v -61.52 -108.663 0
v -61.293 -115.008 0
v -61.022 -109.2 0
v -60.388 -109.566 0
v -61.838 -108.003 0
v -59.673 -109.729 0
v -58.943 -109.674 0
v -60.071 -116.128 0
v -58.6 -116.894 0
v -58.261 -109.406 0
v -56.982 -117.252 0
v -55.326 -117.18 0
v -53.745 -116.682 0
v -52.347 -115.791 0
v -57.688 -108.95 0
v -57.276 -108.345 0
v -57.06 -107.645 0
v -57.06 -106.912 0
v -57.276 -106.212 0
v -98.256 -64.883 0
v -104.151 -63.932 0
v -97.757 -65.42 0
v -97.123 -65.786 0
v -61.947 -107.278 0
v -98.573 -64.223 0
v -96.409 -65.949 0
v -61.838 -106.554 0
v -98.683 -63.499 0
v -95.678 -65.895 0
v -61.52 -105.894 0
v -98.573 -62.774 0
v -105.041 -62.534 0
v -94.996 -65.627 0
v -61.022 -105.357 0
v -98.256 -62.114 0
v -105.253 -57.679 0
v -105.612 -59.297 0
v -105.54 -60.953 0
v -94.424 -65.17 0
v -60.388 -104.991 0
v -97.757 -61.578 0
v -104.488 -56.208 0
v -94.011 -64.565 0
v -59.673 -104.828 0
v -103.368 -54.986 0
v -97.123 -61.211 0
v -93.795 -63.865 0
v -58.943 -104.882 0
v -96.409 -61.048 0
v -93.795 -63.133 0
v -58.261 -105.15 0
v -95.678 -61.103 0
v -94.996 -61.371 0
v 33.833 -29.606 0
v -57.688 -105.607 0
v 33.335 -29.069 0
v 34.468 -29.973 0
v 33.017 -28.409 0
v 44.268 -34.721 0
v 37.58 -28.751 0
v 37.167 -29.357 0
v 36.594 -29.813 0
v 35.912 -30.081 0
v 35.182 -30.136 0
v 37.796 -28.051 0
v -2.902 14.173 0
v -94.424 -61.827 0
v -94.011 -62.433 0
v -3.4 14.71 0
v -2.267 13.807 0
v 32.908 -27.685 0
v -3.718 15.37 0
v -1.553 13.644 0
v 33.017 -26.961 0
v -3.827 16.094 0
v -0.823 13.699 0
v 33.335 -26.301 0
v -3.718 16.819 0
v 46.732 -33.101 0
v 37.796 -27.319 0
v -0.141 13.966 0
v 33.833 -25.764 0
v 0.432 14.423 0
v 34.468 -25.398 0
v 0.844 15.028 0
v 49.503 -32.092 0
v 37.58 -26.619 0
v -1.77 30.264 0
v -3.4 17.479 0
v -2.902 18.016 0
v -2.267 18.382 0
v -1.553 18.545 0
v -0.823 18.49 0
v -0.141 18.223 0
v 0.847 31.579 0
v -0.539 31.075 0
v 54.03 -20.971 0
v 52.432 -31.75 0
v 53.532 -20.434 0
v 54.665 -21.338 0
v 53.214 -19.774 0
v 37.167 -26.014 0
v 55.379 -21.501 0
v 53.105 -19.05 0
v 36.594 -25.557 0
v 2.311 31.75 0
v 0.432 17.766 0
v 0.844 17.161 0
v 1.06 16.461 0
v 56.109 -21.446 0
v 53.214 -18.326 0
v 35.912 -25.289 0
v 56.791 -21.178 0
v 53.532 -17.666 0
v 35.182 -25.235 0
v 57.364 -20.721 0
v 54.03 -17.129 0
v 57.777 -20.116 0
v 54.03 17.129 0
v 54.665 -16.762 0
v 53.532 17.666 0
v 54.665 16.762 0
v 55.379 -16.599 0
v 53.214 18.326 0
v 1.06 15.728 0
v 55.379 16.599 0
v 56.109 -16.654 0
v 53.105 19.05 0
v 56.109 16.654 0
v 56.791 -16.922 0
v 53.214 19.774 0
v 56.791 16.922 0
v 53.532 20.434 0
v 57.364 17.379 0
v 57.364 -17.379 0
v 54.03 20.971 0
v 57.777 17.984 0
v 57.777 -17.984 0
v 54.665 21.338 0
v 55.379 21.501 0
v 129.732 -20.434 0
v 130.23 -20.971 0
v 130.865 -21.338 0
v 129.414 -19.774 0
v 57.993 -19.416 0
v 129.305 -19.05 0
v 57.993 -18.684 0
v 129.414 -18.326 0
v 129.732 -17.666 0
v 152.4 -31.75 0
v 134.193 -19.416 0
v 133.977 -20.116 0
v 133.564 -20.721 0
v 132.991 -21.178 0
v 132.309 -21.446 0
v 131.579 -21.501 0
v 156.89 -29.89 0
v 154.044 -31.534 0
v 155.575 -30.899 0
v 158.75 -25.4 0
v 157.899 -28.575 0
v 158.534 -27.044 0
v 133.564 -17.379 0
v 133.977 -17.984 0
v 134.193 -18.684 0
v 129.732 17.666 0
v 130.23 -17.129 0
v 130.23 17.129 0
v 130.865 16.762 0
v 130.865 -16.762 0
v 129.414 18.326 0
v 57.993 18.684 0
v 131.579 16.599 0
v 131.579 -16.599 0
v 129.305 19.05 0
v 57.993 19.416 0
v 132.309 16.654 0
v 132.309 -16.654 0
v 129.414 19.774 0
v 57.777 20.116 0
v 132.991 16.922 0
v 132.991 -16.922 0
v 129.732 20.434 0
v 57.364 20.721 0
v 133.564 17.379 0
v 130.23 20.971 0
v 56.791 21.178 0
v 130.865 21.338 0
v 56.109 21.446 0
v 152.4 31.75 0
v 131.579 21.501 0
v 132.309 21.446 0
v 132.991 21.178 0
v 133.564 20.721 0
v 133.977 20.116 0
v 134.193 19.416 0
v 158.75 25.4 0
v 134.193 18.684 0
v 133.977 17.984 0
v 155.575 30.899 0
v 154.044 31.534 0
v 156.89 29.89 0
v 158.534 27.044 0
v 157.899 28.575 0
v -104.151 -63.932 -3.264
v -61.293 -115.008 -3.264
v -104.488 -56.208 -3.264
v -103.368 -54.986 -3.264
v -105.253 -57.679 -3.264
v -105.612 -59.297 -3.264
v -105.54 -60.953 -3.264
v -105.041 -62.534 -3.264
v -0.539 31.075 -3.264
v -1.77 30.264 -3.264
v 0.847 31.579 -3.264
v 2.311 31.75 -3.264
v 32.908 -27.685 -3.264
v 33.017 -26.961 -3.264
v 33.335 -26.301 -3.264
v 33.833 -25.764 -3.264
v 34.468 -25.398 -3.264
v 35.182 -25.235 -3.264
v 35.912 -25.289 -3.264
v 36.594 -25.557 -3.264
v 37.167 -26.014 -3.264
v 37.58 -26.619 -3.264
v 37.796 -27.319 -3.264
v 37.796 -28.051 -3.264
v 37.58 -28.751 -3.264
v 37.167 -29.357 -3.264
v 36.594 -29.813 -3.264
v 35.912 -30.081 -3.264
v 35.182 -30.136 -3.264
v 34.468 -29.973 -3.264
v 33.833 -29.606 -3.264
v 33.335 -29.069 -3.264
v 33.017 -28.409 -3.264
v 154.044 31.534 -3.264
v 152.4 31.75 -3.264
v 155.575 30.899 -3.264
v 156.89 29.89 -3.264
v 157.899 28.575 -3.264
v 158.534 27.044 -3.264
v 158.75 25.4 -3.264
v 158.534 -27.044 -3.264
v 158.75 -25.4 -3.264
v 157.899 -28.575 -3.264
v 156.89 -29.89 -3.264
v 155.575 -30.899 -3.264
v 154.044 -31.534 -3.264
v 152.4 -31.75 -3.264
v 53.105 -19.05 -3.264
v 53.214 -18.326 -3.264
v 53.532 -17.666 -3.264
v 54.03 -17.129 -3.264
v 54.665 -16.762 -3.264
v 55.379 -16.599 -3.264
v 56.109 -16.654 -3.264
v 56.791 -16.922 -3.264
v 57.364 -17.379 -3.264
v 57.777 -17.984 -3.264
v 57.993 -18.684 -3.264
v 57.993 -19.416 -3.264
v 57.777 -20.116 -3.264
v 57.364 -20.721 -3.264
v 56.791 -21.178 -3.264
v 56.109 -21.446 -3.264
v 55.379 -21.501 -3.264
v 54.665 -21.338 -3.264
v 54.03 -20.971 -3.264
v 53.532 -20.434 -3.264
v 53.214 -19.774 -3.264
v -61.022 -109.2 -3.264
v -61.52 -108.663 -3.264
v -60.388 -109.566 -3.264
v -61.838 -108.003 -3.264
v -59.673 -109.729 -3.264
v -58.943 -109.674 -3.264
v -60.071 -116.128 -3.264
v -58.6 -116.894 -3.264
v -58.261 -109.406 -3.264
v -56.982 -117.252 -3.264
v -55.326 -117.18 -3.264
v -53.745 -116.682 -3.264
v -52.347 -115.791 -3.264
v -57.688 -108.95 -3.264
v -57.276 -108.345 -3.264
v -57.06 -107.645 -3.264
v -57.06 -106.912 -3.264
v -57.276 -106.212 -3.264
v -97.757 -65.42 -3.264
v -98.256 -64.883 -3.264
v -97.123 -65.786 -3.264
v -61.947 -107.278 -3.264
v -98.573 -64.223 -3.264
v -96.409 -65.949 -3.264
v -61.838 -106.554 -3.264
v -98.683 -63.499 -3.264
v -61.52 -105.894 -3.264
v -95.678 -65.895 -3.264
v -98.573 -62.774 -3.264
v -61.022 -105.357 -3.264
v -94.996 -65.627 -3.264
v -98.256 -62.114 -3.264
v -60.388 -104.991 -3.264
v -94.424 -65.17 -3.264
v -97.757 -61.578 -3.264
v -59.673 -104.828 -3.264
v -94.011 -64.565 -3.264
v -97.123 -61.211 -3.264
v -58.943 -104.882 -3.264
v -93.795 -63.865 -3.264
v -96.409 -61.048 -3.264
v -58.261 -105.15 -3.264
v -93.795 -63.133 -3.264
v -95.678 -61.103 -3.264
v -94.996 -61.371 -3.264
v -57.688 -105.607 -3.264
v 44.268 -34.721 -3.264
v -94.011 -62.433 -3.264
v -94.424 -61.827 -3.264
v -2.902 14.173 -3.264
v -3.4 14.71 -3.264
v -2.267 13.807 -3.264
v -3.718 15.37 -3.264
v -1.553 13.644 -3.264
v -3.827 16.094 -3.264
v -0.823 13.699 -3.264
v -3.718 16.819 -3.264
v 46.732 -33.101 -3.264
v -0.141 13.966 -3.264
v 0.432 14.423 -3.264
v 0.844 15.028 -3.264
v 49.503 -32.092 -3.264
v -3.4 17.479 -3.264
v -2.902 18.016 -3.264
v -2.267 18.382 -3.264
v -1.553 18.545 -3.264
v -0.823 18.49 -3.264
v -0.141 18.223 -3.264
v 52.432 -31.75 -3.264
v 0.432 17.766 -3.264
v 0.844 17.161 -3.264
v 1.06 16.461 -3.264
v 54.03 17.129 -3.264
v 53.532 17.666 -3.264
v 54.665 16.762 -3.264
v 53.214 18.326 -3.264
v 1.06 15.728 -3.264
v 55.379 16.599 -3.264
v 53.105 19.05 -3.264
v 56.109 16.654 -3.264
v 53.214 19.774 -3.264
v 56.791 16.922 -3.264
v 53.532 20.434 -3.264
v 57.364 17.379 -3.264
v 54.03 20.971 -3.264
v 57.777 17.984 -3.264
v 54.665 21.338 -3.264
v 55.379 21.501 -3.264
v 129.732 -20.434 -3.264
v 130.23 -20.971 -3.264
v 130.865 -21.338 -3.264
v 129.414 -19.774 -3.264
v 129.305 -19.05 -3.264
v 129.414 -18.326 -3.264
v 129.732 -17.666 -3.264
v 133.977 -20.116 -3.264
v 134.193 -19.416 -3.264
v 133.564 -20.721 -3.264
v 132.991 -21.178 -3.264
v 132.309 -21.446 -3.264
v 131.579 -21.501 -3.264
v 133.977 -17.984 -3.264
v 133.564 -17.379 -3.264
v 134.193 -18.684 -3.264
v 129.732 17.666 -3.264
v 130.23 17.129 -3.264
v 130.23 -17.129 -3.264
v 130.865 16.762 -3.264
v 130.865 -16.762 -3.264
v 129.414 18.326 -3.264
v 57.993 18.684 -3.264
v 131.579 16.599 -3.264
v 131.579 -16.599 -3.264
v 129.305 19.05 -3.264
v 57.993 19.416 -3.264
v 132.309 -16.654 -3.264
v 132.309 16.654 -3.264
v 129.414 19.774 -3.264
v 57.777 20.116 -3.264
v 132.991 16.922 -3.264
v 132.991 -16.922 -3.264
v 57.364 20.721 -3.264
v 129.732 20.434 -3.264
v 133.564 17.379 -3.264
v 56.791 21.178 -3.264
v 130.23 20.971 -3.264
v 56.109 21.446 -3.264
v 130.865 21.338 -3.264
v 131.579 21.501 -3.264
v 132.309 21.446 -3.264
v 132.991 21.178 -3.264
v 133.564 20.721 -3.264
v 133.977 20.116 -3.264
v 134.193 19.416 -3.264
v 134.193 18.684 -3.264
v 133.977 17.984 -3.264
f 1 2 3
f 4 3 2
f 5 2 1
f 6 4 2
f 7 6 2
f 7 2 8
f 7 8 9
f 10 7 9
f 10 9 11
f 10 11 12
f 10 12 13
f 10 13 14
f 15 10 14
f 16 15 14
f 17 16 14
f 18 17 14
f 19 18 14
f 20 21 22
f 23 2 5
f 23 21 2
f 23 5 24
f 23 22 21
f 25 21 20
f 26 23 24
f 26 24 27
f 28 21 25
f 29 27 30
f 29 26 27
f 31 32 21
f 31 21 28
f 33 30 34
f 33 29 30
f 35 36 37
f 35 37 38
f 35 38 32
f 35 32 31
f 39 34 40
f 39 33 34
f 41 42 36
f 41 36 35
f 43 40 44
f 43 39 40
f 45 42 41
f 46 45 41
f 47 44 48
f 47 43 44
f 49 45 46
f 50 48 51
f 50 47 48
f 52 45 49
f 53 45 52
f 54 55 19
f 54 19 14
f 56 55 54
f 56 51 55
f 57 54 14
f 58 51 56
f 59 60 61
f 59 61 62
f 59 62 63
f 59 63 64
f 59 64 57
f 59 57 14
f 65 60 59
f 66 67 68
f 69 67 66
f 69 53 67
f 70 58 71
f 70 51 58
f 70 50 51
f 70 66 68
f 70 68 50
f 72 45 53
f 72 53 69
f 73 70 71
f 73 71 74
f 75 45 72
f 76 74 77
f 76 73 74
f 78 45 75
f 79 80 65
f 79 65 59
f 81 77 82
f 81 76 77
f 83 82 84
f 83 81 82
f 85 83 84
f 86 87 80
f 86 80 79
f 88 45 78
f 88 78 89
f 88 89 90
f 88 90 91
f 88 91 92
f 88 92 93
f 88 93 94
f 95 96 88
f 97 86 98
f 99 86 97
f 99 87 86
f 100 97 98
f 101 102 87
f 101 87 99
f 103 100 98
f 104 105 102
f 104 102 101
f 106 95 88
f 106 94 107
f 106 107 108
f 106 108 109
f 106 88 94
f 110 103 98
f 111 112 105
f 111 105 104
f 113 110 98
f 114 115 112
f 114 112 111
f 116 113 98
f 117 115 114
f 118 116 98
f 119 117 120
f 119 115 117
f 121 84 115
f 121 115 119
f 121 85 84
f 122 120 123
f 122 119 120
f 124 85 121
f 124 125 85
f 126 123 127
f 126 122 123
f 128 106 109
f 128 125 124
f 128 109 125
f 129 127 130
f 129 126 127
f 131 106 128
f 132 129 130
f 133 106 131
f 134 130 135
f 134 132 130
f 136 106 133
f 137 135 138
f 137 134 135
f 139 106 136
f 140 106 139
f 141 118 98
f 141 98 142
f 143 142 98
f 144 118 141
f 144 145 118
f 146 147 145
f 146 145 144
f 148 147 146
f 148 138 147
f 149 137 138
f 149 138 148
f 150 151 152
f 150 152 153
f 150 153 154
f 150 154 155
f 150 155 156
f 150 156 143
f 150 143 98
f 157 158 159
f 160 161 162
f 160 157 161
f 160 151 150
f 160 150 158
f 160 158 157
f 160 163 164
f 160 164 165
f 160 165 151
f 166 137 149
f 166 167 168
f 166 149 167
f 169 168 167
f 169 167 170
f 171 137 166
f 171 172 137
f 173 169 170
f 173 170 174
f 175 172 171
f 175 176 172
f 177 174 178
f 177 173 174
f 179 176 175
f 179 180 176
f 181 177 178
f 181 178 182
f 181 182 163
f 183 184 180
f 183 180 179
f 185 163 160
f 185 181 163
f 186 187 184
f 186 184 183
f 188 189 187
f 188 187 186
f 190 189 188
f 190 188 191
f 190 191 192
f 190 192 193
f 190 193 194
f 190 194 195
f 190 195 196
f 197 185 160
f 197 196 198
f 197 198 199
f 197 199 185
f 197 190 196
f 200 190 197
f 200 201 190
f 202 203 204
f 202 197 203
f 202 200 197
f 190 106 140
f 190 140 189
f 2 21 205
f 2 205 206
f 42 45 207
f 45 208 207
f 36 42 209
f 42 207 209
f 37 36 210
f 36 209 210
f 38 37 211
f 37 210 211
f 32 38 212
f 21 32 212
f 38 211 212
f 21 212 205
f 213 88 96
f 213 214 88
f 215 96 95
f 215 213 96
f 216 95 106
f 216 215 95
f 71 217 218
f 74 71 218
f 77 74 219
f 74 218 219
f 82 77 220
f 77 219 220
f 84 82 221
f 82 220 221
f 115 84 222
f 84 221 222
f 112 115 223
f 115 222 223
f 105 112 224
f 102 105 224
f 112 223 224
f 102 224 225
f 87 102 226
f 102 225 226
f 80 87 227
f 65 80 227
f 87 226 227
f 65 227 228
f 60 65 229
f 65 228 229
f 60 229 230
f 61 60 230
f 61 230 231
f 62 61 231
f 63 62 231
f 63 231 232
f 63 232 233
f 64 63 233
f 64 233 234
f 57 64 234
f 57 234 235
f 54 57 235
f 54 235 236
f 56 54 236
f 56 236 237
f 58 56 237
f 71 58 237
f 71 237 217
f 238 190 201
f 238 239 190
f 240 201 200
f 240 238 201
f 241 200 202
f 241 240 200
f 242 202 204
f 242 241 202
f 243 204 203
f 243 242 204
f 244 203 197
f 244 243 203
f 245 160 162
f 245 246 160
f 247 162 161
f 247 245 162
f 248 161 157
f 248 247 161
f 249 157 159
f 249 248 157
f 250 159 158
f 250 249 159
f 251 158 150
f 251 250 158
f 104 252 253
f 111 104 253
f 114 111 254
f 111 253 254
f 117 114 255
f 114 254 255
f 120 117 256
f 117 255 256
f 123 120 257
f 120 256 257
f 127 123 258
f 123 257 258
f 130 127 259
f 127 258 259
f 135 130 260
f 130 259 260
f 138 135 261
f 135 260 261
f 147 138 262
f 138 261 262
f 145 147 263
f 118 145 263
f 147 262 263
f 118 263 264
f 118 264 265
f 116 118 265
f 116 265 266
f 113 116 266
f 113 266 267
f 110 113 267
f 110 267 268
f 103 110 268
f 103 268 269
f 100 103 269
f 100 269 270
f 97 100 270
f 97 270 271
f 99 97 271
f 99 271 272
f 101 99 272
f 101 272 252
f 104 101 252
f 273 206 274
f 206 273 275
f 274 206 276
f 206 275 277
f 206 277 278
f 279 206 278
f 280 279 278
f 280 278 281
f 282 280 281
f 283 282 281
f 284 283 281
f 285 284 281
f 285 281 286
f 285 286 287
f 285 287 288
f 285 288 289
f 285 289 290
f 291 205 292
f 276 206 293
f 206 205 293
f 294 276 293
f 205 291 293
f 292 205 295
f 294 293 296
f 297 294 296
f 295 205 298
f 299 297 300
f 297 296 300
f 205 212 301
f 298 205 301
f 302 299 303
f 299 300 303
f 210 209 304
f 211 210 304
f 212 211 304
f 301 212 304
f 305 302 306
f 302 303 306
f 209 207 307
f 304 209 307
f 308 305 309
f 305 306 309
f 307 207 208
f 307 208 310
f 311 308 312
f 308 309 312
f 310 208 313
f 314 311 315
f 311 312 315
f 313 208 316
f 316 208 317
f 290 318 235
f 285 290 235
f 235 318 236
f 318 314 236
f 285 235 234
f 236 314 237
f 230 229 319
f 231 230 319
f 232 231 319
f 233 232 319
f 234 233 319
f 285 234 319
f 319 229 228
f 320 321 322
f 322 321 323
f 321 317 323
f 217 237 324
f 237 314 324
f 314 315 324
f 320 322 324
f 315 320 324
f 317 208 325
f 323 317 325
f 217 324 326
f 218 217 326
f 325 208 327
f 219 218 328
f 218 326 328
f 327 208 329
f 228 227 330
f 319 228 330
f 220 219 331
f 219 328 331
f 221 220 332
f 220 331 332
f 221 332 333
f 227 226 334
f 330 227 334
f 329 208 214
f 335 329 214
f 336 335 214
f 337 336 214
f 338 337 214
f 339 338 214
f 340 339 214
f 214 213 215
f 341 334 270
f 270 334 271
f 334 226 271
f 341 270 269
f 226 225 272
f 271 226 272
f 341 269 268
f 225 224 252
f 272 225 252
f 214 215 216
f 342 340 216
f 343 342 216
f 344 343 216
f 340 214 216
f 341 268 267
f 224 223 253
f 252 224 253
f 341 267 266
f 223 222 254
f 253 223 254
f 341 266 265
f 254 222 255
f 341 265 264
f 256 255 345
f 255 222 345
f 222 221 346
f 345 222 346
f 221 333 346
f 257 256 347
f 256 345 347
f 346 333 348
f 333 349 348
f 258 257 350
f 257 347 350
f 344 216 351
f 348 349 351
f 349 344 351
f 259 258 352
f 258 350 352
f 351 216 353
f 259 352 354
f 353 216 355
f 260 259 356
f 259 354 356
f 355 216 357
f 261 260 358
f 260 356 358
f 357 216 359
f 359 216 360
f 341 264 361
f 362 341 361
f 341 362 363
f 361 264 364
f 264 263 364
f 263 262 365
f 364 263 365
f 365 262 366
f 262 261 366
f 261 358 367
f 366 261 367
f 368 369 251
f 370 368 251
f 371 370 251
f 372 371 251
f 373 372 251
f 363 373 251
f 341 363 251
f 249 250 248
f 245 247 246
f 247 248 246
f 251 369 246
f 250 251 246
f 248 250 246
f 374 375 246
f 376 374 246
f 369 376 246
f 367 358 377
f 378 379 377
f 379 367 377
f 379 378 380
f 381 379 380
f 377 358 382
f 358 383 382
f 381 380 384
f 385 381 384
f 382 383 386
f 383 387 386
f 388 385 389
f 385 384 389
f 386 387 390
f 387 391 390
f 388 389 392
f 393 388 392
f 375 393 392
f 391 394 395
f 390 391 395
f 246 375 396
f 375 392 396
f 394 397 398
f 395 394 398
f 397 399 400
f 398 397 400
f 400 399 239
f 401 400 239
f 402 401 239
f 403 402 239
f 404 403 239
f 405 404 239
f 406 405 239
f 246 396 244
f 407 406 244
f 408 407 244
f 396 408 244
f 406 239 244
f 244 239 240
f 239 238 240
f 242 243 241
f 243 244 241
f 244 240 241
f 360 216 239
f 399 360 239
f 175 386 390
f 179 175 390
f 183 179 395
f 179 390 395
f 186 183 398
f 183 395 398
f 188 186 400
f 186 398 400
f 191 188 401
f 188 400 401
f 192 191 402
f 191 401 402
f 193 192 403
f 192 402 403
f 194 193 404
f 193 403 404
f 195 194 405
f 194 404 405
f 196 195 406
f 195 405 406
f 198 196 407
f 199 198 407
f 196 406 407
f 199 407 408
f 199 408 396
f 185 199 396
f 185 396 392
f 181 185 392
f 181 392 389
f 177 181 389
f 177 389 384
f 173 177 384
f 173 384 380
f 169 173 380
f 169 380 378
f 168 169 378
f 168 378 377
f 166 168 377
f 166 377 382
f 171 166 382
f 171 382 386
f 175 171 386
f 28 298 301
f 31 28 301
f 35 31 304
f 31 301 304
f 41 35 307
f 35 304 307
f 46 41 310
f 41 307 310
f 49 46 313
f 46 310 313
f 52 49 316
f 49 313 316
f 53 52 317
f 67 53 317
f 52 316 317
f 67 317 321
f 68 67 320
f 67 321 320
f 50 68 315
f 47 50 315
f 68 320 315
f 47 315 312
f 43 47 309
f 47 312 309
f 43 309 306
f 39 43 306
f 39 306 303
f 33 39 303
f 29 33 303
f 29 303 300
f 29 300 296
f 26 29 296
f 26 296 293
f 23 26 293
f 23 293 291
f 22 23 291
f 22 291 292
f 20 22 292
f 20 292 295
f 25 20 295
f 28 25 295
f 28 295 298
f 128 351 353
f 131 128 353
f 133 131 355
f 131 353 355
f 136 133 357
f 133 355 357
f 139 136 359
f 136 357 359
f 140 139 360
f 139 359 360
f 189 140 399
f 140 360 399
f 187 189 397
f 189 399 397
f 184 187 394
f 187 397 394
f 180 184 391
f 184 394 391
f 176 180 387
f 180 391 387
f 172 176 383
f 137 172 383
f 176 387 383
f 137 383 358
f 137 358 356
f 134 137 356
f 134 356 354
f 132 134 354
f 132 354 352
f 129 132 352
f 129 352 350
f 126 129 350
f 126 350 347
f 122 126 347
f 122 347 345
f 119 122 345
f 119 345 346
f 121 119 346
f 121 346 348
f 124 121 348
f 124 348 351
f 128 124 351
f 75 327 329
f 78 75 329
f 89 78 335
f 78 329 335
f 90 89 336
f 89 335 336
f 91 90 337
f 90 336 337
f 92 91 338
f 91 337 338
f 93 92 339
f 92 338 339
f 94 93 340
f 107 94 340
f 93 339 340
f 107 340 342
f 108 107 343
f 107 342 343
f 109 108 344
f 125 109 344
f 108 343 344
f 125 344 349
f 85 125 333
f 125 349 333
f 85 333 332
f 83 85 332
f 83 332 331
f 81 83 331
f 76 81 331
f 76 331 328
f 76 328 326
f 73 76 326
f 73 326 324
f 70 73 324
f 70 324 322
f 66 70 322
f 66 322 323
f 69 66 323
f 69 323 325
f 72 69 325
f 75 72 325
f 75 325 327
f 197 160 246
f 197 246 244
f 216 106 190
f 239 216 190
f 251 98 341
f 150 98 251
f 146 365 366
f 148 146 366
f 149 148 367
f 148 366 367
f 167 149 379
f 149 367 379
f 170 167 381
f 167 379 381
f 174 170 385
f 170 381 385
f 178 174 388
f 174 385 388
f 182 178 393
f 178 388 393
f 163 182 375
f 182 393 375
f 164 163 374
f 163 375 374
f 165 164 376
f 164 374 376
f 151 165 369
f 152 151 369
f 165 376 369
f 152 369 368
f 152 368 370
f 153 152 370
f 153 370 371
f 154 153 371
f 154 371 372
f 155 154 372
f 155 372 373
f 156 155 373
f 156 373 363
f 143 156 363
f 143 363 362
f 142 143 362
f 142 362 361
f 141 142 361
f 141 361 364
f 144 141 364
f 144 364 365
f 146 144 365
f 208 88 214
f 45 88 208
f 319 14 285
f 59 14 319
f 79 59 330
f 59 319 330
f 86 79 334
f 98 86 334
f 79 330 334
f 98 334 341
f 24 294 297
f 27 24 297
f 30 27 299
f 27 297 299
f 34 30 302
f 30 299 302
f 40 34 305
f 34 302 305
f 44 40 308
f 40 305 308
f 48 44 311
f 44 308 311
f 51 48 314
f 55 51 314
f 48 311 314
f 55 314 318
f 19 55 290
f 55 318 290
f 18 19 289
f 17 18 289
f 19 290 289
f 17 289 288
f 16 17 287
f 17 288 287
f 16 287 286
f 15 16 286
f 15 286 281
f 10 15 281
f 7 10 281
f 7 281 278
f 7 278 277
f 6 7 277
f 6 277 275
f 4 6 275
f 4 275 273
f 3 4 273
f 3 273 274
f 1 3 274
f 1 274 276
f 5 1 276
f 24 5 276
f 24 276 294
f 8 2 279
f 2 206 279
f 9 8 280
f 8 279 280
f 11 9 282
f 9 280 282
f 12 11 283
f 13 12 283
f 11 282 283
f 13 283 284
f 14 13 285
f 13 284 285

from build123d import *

# Parameters (mm, degrees)
SKETCH1_W                    = 158.75
SKETCH1_H                    = 63.5
BASE_FLANGE1_DEPTH           = 3.2639
F_10_0_1935_DIAMETER_HOLE1_D = 4.9149
BOSS_EXTRUDE1_DEPTH          = 3.2639
F_10_0_1935_DIAMETER_HOLE2_D = 4.9149
FILLET1_R                    = 6.35
FILLET2_R                    = 12.7


# Sheet-metal steps are written as plain solids
with BuildPart() as part:
    # Sketch1 → Base-Flange1 (new body)
    with BuildSketch(Plane.XY):
        with Locations((79.375, 0)):
            Rectangle(SKETCH1_W, SKETCH1_H)
    extrude(amount=-BASE_FLANGE1_DEPTH)

    # #10 (0.1935) Diameter Hole1 (through all)
    with Locations(Plane.XY):
        with Locations((55.5625, 19.05), (55.5625, -19.05), (131.7625, 19.05), (131.7625, -19.05)):
            Hole(F_10_0_1935_DIAMETER_HOLE1_D / 2)

    # Sketch8 → Boss-Extrude1 (add)
    with BuildSketch(Plane.XY):
        Polygon((0, 31.75), (-108.232504257, -59.067854404), (-57.211237738, -119.872632076), (47.809225627, -31.75), (0, -31.75), align=None)
    extrude(amount=-BOSS_EXTRUDE1_DEPTH)

    # #10 (0.1935) Diameter Hole2 (through all)
    with Locations(Plane.XY):
        with Locations((-1.369691562, 16.094353813), (-96.225144731, -63.498821956), (35.365620332, -27.685086111), (-59.489832837, -107.27826188)):
            Hole(F_10_0_1935_DIAMETER_HOLE2_D / 2)

    # Fillet1
    fillet1_edges = [part.edges().sort_by_distance(p)[0] for p in [
        (-108.232504257, -59.067854404, -1.63195),
        (-57.211237738, -119.872632076, -1.63195),
        (0, 31.75, -1.63195),
        (158.75, 31.75, -1.63195),
        (158.75, -31.75, -1.63195),
    ]]
    fillet(fillet1_edges, radius=FILLET1_R)

    # Fillet2
    fillet2_edges = [part.edges().sort_by_distance(p)[0] for p in [
        (47.809225627, -31.75, -1.63195),
    ]]
    fillet(fillet2_edges, radius=FILLET2_R)


solid = part.part
